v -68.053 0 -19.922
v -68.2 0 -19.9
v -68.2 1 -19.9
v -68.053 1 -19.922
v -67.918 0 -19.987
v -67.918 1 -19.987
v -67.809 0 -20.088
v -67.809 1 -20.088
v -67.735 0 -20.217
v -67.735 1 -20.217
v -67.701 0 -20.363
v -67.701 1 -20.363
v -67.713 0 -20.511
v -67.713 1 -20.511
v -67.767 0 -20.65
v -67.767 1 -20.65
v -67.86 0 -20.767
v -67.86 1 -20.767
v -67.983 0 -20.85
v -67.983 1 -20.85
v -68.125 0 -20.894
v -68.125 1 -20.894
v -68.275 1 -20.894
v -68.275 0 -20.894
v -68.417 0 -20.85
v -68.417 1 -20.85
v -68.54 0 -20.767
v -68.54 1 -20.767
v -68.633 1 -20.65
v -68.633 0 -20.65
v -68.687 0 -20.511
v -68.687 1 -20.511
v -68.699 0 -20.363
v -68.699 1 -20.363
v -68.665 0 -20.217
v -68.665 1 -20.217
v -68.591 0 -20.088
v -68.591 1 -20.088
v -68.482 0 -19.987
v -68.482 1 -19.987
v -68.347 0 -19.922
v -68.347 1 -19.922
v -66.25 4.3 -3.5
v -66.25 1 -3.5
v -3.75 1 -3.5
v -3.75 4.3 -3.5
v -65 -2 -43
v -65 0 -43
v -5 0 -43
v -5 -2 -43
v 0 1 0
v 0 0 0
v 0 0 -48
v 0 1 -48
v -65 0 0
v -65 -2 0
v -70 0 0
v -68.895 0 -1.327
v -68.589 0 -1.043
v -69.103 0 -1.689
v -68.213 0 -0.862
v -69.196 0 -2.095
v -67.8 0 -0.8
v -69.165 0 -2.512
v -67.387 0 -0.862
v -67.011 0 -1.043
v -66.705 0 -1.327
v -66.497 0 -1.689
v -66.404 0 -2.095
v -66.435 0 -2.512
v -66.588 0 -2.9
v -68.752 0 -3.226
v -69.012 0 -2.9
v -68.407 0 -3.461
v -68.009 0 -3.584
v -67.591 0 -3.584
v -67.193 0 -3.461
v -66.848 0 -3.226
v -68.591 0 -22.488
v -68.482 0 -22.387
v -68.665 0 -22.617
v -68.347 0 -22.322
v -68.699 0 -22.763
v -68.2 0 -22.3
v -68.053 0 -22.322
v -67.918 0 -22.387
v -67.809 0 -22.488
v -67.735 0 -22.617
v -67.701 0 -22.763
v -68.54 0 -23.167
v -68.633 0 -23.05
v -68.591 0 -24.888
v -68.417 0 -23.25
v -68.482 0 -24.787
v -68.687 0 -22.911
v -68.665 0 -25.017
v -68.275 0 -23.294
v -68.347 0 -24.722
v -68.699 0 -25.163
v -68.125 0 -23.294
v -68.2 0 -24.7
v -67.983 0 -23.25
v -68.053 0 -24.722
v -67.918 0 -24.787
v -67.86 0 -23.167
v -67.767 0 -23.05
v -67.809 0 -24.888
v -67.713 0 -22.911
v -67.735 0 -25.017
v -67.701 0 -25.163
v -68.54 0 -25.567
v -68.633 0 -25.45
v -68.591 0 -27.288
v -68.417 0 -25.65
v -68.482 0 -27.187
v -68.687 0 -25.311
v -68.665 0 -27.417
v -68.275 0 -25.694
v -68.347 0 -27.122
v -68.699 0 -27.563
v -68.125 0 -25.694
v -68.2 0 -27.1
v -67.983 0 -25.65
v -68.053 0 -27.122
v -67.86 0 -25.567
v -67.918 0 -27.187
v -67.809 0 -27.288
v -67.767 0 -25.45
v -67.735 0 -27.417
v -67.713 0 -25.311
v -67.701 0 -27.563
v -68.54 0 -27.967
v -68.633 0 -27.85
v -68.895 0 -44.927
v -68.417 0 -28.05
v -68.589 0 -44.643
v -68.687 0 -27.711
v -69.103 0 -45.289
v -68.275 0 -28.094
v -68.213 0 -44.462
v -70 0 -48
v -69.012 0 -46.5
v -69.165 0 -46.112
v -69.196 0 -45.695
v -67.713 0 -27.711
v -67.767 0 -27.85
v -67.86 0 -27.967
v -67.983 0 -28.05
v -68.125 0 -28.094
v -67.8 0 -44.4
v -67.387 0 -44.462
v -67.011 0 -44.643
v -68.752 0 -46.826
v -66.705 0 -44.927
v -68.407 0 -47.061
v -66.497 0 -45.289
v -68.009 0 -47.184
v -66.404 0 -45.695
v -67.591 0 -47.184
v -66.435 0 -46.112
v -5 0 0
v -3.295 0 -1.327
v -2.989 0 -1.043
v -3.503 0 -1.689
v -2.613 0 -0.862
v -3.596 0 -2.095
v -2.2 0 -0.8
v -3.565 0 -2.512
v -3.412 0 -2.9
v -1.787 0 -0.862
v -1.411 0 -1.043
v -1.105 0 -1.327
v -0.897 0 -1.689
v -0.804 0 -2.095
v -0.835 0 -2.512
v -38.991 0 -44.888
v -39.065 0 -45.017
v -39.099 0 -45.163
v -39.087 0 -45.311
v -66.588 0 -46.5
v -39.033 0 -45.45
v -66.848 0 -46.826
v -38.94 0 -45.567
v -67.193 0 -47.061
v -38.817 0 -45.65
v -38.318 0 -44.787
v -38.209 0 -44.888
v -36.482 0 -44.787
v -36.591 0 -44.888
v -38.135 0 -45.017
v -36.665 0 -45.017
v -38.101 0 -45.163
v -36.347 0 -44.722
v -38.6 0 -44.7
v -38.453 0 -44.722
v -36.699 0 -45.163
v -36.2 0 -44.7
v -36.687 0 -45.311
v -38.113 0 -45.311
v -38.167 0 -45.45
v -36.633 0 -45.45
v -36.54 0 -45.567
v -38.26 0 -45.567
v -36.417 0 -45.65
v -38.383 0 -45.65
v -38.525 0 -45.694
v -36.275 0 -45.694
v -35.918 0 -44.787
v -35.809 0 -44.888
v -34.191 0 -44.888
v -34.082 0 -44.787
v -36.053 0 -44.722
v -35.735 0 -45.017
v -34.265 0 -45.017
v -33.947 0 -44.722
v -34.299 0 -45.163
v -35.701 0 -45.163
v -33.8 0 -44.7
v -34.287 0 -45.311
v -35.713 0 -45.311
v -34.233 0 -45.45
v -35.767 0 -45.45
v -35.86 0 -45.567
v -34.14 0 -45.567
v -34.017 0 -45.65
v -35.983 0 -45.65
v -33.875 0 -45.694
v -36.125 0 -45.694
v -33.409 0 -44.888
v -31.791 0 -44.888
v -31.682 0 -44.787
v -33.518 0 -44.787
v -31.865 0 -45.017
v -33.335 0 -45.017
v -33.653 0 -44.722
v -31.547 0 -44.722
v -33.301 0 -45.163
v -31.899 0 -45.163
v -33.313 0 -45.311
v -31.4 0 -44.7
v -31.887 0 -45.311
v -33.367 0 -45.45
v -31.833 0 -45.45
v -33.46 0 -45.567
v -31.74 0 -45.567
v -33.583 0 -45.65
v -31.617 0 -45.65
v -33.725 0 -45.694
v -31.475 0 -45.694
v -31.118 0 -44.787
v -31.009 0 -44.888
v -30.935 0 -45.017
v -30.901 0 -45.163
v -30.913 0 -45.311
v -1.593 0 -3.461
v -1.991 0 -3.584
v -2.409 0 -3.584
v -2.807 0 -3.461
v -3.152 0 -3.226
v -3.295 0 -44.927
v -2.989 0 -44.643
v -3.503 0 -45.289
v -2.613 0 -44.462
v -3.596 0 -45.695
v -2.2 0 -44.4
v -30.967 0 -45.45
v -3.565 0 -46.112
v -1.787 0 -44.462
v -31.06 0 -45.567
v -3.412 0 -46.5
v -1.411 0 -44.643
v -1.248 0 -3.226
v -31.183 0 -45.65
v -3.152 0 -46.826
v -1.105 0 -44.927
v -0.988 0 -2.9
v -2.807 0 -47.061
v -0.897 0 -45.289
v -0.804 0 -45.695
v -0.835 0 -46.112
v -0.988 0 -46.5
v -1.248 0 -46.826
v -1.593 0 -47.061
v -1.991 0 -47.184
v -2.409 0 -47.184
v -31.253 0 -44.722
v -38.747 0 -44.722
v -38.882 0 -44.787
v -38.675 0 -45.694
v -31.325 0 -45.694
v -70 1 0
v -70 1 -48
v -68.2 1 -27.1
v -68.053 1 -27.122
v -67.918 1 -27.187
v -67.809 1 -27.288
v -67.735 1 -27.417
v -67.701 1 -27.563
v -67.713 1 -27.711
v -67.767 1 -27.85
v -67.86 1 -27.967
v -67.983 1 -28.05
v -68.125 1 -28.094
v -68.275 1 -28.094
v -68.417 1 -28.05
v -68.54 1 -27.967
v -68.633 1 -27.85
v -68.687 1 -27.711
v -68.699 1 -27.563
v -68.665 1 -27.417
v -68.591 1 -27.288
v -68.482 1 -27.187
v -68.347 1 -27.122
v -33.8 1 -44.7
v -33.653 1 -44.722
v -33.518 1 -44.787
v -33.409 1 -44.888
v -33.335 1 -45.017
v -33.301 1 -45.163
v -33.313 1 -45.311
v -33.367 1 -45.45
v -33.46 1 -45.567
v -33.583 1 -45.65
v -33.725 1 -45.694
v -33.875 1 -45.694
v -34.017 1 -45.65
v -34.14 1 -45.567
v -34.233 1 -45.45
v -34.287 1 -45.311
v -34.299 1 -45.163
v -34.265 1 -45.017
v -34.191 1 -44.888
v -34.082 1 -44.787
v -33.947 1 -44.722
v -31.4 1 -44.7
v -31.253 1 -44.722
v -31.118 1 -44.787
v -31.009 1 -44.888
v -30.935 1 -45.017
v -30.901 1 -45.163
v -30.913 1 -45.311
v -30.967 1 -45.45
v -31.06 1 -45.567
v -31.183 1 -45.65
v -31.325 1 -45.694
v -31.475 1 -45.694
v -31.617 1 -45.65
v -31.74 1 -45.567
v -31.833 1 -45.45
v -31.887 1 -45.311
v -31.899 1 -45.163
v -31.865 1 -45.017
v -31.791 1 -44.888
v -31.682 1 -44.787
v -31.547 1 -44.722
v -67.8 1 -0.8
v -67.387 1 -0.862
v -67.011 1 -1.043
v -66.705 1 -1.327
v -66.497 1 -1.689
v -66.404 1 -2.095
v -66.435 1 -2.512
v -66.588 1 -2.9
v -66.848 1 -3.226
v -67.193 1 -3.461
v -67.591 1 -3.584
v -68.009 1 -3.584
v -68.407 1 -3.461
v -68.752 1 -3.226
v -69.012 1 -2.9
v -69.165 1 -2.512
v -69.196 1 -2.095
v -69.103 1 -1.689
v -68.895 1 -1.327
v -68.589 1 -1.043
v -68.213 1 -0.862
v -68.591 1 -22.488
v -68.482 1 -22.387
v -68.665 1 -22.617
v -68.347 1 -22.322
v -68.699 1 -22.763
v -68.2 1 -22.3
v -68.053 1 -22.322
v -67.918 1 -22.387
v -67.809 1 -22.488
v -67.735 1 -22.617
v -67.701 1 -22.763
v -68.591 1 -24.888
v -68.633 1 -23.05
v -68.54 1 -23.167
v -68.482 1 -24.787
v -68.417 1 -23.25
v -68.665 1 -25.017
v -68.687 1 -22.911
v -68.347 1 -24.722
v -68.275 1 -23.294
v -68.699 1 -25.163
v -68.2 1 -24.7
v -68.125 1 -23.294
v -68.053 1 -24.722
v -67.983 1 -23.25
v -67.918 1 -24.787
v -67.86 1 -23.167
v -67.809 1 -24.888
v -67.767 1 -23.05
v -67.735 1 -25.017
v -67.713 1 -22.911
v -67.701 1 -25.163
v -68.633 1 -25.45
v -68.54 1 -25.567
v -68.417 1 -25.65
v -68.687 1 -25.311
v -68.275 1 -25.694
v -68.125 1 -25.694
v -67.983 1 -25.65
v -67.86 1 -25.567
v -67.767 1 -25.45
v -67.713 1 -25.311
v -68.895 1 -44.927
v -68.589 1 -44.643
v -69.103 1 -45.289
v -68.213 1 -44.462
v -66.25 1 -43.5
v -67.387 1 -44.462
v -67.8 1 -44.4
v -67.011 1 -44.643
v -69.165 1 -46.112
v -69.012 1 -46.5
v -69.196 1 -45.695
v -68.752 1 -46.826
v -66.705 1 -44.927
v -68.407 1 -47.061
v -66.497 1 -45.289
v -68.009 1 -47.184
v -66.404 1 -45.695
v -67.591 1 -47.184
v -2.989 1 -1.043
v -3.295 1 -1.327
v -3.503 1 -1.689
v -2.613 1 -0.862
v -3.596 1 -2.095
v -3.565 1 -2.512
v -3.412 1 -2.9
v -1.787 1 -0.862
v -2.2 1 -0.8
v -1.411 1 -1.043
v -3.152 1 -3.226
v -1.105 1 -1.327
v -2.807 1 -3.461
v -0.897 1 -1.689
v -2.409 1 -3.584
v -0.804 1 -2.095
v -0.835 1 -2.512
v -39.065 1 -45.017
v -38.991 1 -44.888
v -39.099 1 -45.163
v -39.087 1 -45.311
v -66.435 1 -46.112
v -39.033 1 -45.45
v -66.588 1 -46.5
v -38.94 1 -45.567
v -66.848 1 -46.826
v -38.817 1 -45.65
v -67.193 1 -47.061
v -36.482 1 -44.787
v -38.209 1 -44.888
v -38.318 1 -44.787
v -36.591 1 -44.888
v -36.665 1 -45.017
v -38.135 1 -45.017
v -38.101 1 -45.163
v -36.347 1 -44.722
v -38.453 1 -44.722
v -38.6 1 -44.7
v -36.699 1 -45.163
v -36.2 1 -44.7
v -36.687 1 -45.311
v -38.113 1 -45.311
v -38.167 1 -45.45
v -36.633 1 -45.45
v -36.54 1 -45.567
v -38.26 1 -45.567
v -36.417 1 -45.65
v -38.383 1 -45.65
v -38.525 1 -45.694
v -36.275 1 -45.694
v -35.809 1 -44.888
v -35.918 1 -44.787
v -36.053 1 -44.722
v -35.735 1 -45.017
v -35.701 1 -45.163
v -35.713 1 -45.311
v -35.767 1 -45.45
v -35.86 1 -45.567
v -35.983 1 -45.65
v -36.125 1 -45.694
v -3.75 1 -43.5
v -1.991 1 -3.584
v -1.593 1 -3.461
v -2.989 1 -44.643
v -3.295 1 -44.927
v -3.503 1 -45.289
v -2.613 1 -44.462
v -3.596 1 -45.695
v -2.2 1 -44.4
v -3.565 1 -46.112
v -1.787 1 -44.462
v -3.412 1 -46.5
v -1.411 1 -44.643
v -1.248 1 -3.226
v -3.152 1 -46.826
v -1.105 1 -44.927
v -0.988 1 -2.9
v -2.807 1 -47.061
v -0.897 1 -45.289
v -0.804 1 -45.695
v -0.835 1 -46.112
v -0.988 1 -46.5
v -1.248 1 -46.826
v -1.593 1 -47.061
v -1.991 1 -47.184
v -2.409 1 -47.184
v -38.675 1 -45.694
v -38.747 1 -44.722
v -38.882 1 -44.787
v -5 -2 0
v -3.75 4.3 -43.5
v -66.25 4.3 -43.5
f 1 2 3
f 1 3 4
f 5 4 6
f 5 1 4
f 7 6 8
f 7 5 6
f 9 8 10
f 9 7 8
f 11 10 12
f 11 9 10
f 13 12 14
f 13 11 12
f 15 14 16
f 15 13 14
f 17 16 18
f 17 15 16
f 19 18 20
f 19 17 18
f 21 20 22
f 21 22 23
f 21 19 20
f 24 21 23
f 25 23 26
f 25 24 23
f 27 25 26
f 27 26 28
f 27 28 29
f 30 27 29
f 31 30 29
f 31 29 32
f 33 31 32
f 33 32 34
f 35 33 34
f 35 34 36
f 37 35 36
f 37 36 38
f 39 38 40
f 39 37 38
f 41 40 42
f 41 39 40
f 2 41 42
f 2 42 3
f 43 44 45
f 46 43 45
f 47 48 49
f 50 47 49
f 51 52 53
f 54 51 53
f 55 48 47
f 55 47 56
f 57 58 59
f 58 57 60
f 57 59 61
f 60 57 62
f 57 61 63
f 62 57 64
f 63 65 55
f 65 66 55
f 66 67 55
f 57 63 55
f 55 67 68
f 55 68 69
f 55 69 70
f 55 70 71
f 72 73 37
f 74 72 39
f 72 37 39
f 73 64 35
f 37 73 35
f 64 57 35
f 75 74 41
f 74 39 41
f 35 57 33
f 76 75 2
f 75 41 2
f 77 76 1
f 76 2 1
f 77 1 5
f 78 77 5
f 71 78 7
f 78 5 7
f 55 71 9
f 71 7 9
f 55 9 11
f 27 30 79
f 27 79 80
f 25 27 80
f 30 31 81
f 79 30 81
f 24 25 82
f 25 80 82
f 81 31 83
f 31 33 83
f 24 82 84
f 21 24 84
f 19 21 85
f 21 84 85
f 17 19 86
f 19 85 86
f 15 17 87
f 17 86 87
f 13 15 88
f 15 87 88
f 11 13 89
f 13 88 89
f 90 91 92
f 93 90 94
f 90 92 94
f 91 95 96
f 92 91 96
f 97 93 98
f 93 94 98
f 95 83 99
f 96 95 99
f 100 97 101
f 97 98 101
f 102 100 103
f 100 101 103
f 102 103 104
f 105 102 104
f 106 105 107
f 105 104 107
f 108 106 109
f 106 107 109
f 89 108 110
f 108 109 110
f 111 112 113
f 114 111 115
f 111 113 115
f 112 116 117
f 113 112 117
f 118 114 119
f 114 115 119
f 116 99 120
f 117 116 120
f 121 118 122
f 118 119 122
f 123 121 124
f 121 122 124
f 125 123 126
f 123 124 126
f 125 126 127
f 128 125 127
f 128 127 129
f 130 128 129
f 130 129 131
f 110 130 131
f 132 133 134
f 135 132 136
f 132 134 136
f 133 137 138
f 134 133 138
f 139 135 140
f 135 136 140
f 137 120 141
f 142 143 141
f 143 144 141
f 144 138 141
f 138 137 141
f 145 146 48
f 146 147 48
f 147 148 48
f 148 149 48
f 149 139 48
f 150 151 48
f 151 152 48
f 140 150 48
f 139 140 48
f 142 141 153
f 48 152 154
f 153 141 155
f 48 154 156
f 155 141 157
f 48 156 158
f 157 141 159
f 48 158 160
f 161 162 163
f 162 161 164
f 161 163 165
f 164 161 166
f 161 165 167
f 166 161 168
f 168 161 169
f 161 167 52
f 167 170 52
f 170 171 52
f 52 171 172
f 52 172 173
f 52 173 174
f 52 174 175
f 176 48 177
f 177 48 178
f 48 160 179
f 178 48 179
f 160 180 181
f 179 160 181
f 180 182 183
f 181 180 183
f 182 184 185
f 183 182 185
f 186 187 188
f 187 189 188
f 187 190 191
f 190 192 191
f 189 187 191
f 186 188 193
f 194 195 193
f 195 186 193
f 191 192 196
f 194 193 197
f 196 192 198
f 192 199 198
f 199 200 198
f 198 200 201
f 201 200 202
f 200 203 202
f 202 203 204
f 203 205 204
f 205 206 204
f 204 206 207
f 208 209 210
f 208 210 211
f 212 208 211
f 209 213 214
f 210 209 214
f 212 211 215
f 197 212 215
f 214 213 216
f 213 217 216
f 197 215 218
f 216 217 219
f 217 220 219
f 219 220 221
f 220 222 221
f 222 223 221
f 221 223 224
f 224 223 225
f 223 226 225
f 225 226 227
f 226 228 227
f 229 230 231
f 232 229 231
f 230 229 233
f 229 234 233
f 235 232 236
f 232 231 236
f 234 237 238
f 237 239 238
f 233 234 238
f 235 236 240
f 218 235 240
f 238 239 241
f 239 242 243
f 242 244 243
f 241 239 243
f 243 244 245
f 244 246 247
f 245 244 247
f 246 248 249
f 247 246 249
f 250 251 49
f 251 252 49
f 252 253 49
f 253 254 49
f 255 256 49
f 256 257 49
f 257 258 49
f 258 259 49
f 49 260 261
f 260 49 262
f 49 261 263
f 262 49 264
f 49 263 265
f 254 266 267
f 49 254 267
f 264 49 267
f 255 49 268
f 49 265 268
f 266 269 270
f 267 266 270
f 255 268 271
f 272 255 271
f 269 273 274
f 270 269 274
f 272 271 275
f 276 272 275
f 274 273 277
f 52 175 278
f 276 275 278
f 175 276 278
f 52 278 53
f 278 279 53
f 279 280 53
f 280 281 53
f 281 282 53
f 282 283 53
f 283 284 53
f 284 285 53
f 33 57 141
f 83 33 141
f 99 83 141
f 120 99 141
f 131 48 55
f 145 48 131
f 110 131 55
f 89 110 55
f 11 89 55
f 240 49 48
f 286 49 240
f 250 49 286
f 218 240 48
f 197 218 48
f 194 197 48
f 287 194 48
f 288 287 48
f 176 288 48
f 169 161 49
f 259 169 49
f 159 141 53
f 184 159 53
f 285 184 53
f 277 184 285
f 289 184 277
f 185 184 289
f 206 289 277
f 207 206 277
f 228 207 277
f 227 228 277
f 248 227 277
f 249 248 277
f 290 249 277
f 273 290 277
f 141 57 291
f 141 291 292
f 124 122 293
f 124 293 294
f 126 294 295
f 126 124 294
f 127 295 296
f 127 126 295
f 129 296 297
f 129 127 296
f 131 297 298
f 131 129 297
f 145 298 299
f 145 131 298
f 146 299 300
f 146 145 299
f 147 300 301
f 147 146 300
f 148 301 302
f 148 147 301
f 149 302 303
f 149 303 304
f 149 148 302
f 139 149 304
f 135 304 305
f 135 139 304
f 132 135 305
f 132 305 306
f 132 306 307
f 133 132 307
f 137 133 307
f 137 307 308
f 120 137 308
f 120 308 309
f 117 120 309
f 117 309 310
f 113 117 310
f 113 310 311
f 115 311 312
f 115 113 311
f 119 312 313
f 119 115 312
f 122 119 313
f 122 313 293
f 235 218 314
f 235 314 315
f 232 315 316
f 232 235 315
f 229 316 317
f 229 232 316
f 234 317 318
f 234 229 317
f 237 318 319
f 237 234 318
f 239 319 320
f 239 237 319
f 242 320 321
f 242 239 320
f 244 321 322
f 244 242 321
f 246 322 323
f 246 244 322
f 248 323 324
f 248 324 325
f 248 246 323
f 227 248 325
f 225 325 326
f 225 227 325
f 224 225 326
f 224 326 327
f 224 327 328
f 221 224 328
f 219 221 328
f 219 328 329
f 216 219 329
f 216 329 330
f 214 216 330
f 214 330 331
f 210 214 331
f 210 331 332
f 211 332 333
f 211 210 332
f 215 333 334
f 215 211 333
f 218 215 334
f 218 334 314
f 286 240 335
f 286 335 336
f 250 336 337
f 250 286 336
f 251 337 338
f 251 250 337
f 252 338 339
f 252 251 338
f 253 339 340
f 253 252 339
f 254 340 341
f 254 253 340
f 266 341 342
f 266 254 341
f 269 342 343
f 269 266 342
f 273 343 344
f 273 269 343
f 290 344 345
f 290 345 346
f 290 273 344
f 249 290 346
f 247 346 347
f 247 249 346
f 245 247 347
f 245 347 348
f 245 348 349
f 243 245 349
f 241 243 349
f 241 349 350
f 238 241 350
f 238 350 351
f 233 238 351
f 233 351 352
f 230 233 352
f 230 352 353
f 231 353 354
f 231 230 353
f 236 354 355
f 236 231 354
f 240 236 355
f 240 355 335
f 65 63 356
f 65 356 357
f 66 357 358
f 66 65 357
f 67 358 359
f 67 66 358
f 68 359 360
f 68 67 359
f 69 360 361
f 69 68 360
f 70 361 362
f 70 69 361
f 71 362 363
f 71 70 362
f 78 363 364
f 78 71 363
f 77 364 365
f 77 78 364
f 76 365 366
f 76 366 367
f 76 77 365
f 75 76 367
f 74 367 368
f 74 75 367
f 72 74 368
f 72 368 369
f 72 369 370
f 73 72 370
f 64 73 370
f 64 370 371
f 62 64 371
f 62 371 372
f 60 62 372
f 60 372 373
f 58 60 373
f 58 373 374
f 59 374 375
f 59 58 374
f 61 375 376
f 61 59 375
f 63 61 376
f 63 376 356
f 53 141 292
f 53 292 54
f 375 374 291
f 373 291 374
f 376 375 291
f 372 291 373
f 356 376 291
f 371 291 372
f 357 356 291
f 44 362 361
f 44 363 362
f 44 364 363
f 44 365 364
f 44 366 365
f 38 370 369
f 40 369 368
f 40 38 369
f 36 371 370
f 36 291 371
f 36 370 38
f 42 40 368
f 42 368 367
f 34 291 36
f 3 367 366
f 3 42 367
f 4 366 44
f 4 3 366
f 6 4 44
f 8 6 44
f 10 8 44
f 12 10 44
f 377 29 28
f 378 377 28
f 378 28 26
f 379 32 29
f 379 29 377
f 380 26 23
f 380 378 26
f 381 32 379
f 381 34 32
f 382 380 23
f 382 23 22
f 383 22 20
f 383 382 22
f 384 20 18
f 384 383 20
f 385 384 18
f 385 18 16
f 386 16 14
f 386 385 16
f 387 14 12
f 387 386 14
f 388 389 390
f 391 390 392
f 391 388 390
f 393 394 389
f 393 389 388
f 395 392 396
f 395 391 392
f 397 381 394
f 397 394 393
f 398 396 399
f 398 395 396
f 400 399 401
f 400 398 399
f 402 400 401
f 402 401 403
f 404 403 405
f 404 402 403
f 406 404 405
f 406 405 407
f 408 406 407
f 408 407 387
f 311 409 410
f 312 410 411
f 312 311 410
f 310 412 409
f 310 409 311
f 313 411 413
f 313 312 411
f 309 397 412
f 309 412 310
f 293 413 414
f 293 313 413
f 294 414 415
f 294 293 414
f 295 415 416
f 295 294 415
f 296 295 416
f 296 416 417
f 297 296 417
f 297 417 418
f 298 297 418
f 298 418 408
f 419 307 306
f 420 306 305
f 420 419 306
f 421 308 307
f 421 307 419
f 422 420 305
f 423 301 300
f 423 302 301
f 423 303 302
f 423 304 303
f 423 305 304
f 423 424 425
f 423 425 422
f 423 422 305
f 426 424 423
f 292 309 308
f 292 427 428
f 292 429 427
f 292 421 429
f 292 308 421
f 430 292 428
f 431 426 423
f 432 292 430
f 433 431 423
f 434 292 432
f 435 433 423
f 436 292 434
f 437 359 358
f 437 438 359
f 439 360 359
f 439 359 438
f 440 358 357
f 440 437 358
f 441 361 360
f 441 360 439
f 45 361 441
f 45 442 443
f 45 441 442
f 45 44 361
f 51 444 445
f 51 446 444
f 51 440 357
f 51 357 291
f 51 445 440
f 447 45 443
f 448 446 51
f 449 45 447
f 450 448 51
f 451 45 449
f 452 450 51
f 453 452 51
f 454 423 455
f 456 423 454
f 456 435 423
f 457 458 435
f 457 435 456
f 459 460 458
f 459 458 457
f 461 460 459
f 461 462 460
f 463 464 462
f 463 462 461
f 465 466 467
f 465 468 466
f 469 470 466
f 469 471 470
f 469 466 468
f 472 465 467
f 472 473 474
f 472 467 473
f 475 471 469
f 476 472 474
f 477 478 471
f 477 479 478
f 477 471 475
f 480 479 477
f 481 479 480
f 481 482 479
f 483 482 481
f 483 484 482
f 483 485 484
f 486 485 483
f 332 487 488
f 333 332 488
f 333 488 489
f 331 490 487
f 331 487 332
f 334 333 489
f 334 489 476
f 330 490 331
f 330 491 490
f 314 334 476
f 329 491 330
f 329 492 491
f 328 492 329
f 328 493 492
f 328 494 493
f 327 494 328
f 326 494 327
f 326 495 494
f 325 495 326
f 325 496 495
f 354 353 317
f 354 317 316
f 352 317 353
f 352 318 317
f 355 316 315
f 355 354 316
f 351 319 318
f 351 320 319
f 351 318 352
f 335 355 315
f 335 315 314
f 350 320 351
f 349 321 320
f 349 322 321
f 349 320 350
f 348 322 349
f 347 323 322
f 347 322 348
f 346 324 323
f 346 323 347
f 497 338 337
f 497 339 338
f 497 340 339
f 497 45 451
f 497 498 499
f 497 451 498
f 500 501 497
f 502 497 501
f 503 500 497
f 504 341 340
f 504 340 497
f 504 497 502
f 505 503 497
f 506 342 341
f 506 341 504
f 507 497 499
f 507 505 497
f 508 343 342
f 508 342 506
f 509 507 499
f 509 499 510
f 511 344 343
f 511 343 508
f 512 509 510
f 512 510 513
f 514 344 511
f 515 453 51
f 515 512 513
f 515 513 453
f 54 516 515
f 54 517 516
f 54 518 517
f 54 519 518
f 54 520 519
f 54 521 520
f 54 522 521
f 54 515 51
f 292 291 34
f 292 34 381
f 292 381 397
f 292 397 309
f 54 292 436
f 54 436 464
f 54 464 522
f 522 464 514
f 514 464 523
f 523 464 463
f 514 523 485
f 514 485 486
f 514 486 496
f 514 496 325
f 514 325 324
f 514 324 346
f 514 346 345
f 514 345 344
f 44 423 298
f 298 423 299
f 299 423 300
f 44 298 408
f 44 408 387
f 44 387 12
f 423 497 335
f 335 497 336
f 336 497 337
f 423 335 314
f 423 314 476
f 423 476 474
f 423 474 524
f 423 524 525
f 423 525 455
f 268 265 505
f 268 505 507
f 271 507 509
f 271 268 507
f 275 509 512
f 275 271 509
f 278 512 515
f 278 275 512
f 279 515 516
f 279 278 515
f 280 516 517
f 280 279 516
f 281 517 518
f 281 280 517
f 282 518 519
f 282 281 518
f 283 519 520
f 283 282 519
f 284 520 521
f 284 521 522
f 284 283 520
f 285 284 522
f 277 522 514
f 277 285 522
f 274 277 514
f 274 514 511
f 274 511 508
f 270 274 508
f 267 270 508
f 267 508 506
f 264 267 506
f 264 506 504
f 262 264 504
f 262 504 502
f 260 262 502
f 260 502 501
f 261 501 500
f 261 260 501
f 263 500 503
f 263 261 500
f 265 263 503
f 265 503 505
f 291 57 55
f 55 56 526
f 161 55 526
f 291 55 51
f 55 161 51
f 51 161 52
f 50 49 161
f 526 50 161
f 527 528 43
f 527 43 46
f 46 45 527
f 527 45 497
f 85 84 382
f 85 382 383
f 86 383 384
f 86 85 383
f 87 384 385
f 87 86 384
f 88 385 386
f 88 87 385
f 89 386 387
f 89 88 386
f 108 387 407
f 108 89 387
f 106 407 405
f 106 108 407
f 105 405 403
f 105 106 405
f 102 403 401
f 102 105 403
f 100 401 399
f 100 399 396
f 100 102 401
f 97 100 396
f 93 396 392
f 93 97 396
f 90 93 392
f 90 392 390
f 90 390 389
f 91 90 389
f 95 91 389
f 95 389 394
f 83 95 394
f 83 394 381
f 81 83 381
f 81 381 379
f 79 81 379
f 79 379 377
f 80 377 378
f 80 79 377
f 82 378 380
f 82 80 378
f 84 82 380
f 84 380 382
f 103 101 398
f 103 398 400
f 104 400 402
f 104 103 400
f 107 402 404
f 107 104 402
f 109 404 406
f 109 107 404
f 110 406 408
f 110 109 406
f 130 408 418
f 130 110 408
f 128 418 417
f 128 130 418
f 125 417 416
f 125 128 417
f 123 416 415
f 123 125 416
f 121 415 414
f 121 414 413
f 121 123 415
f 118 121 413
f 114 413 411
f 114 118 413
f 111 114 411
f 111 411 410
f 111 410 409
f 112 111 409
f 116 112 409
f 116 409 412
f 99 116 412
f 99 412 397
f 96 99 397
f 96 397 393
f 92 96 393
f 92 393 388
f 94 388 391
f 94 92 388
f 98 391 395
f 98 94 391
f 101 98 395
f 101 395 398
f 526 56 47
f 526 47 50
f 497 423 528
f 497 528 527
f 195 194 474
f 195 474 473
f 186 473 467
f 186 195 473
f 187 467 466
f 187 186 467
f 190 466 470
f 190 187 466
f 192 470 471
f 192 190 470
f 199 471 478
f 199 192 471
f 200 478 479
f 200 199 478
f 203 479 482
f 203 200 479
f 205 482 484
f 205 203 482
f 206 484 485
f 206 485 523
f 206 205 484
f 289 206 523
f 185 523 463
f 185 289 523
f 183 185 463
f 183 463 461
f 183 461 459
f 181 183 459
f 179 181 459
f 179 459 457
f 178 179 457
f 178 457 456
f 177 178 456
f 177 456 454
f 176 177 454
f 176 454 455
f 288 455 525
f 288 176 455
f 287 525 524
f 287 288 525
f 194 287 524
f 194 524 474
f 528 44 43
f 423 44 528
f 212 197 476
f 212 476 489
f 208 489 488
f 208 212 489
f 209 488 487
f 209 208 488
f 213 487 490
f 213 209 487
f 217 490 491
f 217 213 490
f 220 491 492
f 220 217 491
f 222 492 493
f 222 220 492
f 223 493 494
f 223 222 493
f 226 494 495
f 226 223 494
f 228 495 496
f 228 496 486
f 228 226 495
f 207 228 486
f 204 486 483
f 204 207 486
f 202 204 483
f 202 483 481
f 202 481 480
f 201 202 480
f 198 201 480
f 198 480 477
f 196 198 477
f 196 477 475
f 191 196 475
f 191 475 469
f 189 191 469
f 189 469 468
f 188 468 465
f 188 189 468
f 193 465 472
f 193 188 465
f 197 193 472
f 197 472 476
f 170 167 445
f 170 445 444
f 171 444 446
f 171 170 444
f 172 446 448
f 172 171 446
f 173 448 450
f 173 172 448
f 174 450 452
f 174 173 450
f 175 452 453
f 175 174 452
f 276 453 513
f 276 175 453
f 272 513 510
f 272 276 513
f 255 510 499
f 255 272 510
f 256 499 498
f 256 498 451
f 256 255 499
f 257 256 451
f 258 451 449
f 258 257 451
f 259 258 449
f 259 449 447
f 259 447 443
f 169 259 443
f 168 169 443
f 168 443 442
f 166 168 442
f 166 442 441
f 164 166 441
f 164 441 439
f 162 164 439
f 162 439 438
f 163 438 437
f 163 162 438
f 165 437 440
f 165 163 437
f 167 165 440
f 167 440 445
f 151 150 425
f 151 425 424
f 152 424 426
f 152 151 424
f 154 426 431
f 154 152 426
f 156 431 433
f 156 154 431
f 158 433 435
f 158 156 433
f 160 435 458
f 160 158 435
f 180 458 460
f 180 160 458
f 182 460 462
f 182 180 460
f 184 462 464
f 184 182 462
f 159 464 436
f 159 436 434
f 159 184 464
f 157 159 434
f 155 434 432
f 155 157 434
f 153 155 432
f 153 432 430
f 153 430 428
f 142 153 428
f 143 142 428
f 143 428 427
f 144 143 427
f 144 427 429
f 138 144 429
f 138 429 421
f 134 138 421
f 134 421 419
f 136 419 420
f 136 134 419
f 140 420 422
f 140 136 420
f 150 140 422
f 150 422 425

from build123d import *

# Parameters (mm, degrees)
SKETCH1_W           = 70
SKETCH1_H           = 48
SKETCH1_R           = 0.5
SKETCH1_R_2         = 1.4
BOSS_EXTRUDE1_DEPTH = 1
SKETCH2_W           = 62.5
SKETCH2_H           = 40
BOSS_EXTRUDE2_DEPTH = 3.3
SKETCH3_W           = 60
SKETCH3_H           = 43
BOSS_EXTRUDE3_DEPTH = 2


with BuildPart() as part:
    # Sketch1 → Boss-Extrude1 (new body)
    with BuildSketch(Plane(origin=(0, 0, 0), x_dir=(1, 0, 0), z_dir=(0, 1, 0))):
        with Locations((-35, 24)):
            Rectangle(SKETCH1_W, SKETCH1_H)
        with Locations(Location((-68.2, 20.4, 0), (0, 0, 270))):
            Circle(SKETCH1_R, mode=Mode.SUBTRACT)
        with Locations(Location((-68.2, 22.8, 0), (0, 0, 270))):
            Circle(SKETCH1_R, mode=Mode.SUBTRACT)
        with Locations(Location((-68.2, 25.2, 0), (0, 0, 270))):
            Circle(SKETCH1_R, mode=Mode.SUBTRACT)
        with Locations(Location((-68.2, 27.6, 0), (0, 0, 270))):
            Circle(SKETCH1_R, mode=Mode.SUBTRACT)
        with Locations(Location((-31.4, 45.2, 0), (0, 0, 270))):
            Circle(SKETCH1_R, mode=Mode.SUBTRACT)
        with Locations(Location((-33.8, 45.2, 0), (0, 0, 270))):
            Circle(SKETCH1_R, mode=Mode.SUBTRACT)
        with Locations(Location((-36.2, 45.2, 0), (0, 0, 270))):
            Circle(SKETCH1_R, mode=Mode.SUBTRACT)
        with Locations(Location((-38.6, 45.2, 0), (0, 0, 270))):
            Circle(SKETCH1_R, mode=Mode.SUBTRACT)
        with Locations(Location((-67.8, 45.8, 0), (0, 0, 270))):
            Circle(SKETCH1_R_2, mode=Mode.SUBTRACT)
        with Locations(Location((-67.8, 2.2, 0), (0, 0, 270))):
            Circle(SKETCH1_R_2, mode=Mode.SUBTRACT)
        with Locations(Location((-2.2, 2.2, 0), (0, 0, 270))):
            Circle(SKETCH1_R_2, mode=Mode.SUBTRACT)
        with Locations(Location((-2.2, 45.8, 0), (0, 0, 270))):
            Circle(SKETCH1_R_2, mode=Mode.SUBTRACT)
    extrude(amount=BOSS_EXTRUDE1_DEPTH)

    # Sketch2 → Boss-Extrude2 (add)
    with BuildSketch(Plane(origin=(0, 1, 0), x_dir=(1, 0, 0), z_dir=(0, 1, 0))):
        with Locations((-35, 23.5)):
            Rectangle(SKETCH2_W, SKETCH2_H)
    extrude(amount=BOSS_EXTRUDE2_DEPTH)

    # Sketch3 → Boss-Extrude3 (add)
    with BuildSketch(Plane.XZ):
        with Locations((-35, -21.5)):
            Rectangle(SKETCH3_W, SKETCH3_H)
    extrude(amount=BOSS_EXTRUDE3_DEPTH)


solid = part.part
